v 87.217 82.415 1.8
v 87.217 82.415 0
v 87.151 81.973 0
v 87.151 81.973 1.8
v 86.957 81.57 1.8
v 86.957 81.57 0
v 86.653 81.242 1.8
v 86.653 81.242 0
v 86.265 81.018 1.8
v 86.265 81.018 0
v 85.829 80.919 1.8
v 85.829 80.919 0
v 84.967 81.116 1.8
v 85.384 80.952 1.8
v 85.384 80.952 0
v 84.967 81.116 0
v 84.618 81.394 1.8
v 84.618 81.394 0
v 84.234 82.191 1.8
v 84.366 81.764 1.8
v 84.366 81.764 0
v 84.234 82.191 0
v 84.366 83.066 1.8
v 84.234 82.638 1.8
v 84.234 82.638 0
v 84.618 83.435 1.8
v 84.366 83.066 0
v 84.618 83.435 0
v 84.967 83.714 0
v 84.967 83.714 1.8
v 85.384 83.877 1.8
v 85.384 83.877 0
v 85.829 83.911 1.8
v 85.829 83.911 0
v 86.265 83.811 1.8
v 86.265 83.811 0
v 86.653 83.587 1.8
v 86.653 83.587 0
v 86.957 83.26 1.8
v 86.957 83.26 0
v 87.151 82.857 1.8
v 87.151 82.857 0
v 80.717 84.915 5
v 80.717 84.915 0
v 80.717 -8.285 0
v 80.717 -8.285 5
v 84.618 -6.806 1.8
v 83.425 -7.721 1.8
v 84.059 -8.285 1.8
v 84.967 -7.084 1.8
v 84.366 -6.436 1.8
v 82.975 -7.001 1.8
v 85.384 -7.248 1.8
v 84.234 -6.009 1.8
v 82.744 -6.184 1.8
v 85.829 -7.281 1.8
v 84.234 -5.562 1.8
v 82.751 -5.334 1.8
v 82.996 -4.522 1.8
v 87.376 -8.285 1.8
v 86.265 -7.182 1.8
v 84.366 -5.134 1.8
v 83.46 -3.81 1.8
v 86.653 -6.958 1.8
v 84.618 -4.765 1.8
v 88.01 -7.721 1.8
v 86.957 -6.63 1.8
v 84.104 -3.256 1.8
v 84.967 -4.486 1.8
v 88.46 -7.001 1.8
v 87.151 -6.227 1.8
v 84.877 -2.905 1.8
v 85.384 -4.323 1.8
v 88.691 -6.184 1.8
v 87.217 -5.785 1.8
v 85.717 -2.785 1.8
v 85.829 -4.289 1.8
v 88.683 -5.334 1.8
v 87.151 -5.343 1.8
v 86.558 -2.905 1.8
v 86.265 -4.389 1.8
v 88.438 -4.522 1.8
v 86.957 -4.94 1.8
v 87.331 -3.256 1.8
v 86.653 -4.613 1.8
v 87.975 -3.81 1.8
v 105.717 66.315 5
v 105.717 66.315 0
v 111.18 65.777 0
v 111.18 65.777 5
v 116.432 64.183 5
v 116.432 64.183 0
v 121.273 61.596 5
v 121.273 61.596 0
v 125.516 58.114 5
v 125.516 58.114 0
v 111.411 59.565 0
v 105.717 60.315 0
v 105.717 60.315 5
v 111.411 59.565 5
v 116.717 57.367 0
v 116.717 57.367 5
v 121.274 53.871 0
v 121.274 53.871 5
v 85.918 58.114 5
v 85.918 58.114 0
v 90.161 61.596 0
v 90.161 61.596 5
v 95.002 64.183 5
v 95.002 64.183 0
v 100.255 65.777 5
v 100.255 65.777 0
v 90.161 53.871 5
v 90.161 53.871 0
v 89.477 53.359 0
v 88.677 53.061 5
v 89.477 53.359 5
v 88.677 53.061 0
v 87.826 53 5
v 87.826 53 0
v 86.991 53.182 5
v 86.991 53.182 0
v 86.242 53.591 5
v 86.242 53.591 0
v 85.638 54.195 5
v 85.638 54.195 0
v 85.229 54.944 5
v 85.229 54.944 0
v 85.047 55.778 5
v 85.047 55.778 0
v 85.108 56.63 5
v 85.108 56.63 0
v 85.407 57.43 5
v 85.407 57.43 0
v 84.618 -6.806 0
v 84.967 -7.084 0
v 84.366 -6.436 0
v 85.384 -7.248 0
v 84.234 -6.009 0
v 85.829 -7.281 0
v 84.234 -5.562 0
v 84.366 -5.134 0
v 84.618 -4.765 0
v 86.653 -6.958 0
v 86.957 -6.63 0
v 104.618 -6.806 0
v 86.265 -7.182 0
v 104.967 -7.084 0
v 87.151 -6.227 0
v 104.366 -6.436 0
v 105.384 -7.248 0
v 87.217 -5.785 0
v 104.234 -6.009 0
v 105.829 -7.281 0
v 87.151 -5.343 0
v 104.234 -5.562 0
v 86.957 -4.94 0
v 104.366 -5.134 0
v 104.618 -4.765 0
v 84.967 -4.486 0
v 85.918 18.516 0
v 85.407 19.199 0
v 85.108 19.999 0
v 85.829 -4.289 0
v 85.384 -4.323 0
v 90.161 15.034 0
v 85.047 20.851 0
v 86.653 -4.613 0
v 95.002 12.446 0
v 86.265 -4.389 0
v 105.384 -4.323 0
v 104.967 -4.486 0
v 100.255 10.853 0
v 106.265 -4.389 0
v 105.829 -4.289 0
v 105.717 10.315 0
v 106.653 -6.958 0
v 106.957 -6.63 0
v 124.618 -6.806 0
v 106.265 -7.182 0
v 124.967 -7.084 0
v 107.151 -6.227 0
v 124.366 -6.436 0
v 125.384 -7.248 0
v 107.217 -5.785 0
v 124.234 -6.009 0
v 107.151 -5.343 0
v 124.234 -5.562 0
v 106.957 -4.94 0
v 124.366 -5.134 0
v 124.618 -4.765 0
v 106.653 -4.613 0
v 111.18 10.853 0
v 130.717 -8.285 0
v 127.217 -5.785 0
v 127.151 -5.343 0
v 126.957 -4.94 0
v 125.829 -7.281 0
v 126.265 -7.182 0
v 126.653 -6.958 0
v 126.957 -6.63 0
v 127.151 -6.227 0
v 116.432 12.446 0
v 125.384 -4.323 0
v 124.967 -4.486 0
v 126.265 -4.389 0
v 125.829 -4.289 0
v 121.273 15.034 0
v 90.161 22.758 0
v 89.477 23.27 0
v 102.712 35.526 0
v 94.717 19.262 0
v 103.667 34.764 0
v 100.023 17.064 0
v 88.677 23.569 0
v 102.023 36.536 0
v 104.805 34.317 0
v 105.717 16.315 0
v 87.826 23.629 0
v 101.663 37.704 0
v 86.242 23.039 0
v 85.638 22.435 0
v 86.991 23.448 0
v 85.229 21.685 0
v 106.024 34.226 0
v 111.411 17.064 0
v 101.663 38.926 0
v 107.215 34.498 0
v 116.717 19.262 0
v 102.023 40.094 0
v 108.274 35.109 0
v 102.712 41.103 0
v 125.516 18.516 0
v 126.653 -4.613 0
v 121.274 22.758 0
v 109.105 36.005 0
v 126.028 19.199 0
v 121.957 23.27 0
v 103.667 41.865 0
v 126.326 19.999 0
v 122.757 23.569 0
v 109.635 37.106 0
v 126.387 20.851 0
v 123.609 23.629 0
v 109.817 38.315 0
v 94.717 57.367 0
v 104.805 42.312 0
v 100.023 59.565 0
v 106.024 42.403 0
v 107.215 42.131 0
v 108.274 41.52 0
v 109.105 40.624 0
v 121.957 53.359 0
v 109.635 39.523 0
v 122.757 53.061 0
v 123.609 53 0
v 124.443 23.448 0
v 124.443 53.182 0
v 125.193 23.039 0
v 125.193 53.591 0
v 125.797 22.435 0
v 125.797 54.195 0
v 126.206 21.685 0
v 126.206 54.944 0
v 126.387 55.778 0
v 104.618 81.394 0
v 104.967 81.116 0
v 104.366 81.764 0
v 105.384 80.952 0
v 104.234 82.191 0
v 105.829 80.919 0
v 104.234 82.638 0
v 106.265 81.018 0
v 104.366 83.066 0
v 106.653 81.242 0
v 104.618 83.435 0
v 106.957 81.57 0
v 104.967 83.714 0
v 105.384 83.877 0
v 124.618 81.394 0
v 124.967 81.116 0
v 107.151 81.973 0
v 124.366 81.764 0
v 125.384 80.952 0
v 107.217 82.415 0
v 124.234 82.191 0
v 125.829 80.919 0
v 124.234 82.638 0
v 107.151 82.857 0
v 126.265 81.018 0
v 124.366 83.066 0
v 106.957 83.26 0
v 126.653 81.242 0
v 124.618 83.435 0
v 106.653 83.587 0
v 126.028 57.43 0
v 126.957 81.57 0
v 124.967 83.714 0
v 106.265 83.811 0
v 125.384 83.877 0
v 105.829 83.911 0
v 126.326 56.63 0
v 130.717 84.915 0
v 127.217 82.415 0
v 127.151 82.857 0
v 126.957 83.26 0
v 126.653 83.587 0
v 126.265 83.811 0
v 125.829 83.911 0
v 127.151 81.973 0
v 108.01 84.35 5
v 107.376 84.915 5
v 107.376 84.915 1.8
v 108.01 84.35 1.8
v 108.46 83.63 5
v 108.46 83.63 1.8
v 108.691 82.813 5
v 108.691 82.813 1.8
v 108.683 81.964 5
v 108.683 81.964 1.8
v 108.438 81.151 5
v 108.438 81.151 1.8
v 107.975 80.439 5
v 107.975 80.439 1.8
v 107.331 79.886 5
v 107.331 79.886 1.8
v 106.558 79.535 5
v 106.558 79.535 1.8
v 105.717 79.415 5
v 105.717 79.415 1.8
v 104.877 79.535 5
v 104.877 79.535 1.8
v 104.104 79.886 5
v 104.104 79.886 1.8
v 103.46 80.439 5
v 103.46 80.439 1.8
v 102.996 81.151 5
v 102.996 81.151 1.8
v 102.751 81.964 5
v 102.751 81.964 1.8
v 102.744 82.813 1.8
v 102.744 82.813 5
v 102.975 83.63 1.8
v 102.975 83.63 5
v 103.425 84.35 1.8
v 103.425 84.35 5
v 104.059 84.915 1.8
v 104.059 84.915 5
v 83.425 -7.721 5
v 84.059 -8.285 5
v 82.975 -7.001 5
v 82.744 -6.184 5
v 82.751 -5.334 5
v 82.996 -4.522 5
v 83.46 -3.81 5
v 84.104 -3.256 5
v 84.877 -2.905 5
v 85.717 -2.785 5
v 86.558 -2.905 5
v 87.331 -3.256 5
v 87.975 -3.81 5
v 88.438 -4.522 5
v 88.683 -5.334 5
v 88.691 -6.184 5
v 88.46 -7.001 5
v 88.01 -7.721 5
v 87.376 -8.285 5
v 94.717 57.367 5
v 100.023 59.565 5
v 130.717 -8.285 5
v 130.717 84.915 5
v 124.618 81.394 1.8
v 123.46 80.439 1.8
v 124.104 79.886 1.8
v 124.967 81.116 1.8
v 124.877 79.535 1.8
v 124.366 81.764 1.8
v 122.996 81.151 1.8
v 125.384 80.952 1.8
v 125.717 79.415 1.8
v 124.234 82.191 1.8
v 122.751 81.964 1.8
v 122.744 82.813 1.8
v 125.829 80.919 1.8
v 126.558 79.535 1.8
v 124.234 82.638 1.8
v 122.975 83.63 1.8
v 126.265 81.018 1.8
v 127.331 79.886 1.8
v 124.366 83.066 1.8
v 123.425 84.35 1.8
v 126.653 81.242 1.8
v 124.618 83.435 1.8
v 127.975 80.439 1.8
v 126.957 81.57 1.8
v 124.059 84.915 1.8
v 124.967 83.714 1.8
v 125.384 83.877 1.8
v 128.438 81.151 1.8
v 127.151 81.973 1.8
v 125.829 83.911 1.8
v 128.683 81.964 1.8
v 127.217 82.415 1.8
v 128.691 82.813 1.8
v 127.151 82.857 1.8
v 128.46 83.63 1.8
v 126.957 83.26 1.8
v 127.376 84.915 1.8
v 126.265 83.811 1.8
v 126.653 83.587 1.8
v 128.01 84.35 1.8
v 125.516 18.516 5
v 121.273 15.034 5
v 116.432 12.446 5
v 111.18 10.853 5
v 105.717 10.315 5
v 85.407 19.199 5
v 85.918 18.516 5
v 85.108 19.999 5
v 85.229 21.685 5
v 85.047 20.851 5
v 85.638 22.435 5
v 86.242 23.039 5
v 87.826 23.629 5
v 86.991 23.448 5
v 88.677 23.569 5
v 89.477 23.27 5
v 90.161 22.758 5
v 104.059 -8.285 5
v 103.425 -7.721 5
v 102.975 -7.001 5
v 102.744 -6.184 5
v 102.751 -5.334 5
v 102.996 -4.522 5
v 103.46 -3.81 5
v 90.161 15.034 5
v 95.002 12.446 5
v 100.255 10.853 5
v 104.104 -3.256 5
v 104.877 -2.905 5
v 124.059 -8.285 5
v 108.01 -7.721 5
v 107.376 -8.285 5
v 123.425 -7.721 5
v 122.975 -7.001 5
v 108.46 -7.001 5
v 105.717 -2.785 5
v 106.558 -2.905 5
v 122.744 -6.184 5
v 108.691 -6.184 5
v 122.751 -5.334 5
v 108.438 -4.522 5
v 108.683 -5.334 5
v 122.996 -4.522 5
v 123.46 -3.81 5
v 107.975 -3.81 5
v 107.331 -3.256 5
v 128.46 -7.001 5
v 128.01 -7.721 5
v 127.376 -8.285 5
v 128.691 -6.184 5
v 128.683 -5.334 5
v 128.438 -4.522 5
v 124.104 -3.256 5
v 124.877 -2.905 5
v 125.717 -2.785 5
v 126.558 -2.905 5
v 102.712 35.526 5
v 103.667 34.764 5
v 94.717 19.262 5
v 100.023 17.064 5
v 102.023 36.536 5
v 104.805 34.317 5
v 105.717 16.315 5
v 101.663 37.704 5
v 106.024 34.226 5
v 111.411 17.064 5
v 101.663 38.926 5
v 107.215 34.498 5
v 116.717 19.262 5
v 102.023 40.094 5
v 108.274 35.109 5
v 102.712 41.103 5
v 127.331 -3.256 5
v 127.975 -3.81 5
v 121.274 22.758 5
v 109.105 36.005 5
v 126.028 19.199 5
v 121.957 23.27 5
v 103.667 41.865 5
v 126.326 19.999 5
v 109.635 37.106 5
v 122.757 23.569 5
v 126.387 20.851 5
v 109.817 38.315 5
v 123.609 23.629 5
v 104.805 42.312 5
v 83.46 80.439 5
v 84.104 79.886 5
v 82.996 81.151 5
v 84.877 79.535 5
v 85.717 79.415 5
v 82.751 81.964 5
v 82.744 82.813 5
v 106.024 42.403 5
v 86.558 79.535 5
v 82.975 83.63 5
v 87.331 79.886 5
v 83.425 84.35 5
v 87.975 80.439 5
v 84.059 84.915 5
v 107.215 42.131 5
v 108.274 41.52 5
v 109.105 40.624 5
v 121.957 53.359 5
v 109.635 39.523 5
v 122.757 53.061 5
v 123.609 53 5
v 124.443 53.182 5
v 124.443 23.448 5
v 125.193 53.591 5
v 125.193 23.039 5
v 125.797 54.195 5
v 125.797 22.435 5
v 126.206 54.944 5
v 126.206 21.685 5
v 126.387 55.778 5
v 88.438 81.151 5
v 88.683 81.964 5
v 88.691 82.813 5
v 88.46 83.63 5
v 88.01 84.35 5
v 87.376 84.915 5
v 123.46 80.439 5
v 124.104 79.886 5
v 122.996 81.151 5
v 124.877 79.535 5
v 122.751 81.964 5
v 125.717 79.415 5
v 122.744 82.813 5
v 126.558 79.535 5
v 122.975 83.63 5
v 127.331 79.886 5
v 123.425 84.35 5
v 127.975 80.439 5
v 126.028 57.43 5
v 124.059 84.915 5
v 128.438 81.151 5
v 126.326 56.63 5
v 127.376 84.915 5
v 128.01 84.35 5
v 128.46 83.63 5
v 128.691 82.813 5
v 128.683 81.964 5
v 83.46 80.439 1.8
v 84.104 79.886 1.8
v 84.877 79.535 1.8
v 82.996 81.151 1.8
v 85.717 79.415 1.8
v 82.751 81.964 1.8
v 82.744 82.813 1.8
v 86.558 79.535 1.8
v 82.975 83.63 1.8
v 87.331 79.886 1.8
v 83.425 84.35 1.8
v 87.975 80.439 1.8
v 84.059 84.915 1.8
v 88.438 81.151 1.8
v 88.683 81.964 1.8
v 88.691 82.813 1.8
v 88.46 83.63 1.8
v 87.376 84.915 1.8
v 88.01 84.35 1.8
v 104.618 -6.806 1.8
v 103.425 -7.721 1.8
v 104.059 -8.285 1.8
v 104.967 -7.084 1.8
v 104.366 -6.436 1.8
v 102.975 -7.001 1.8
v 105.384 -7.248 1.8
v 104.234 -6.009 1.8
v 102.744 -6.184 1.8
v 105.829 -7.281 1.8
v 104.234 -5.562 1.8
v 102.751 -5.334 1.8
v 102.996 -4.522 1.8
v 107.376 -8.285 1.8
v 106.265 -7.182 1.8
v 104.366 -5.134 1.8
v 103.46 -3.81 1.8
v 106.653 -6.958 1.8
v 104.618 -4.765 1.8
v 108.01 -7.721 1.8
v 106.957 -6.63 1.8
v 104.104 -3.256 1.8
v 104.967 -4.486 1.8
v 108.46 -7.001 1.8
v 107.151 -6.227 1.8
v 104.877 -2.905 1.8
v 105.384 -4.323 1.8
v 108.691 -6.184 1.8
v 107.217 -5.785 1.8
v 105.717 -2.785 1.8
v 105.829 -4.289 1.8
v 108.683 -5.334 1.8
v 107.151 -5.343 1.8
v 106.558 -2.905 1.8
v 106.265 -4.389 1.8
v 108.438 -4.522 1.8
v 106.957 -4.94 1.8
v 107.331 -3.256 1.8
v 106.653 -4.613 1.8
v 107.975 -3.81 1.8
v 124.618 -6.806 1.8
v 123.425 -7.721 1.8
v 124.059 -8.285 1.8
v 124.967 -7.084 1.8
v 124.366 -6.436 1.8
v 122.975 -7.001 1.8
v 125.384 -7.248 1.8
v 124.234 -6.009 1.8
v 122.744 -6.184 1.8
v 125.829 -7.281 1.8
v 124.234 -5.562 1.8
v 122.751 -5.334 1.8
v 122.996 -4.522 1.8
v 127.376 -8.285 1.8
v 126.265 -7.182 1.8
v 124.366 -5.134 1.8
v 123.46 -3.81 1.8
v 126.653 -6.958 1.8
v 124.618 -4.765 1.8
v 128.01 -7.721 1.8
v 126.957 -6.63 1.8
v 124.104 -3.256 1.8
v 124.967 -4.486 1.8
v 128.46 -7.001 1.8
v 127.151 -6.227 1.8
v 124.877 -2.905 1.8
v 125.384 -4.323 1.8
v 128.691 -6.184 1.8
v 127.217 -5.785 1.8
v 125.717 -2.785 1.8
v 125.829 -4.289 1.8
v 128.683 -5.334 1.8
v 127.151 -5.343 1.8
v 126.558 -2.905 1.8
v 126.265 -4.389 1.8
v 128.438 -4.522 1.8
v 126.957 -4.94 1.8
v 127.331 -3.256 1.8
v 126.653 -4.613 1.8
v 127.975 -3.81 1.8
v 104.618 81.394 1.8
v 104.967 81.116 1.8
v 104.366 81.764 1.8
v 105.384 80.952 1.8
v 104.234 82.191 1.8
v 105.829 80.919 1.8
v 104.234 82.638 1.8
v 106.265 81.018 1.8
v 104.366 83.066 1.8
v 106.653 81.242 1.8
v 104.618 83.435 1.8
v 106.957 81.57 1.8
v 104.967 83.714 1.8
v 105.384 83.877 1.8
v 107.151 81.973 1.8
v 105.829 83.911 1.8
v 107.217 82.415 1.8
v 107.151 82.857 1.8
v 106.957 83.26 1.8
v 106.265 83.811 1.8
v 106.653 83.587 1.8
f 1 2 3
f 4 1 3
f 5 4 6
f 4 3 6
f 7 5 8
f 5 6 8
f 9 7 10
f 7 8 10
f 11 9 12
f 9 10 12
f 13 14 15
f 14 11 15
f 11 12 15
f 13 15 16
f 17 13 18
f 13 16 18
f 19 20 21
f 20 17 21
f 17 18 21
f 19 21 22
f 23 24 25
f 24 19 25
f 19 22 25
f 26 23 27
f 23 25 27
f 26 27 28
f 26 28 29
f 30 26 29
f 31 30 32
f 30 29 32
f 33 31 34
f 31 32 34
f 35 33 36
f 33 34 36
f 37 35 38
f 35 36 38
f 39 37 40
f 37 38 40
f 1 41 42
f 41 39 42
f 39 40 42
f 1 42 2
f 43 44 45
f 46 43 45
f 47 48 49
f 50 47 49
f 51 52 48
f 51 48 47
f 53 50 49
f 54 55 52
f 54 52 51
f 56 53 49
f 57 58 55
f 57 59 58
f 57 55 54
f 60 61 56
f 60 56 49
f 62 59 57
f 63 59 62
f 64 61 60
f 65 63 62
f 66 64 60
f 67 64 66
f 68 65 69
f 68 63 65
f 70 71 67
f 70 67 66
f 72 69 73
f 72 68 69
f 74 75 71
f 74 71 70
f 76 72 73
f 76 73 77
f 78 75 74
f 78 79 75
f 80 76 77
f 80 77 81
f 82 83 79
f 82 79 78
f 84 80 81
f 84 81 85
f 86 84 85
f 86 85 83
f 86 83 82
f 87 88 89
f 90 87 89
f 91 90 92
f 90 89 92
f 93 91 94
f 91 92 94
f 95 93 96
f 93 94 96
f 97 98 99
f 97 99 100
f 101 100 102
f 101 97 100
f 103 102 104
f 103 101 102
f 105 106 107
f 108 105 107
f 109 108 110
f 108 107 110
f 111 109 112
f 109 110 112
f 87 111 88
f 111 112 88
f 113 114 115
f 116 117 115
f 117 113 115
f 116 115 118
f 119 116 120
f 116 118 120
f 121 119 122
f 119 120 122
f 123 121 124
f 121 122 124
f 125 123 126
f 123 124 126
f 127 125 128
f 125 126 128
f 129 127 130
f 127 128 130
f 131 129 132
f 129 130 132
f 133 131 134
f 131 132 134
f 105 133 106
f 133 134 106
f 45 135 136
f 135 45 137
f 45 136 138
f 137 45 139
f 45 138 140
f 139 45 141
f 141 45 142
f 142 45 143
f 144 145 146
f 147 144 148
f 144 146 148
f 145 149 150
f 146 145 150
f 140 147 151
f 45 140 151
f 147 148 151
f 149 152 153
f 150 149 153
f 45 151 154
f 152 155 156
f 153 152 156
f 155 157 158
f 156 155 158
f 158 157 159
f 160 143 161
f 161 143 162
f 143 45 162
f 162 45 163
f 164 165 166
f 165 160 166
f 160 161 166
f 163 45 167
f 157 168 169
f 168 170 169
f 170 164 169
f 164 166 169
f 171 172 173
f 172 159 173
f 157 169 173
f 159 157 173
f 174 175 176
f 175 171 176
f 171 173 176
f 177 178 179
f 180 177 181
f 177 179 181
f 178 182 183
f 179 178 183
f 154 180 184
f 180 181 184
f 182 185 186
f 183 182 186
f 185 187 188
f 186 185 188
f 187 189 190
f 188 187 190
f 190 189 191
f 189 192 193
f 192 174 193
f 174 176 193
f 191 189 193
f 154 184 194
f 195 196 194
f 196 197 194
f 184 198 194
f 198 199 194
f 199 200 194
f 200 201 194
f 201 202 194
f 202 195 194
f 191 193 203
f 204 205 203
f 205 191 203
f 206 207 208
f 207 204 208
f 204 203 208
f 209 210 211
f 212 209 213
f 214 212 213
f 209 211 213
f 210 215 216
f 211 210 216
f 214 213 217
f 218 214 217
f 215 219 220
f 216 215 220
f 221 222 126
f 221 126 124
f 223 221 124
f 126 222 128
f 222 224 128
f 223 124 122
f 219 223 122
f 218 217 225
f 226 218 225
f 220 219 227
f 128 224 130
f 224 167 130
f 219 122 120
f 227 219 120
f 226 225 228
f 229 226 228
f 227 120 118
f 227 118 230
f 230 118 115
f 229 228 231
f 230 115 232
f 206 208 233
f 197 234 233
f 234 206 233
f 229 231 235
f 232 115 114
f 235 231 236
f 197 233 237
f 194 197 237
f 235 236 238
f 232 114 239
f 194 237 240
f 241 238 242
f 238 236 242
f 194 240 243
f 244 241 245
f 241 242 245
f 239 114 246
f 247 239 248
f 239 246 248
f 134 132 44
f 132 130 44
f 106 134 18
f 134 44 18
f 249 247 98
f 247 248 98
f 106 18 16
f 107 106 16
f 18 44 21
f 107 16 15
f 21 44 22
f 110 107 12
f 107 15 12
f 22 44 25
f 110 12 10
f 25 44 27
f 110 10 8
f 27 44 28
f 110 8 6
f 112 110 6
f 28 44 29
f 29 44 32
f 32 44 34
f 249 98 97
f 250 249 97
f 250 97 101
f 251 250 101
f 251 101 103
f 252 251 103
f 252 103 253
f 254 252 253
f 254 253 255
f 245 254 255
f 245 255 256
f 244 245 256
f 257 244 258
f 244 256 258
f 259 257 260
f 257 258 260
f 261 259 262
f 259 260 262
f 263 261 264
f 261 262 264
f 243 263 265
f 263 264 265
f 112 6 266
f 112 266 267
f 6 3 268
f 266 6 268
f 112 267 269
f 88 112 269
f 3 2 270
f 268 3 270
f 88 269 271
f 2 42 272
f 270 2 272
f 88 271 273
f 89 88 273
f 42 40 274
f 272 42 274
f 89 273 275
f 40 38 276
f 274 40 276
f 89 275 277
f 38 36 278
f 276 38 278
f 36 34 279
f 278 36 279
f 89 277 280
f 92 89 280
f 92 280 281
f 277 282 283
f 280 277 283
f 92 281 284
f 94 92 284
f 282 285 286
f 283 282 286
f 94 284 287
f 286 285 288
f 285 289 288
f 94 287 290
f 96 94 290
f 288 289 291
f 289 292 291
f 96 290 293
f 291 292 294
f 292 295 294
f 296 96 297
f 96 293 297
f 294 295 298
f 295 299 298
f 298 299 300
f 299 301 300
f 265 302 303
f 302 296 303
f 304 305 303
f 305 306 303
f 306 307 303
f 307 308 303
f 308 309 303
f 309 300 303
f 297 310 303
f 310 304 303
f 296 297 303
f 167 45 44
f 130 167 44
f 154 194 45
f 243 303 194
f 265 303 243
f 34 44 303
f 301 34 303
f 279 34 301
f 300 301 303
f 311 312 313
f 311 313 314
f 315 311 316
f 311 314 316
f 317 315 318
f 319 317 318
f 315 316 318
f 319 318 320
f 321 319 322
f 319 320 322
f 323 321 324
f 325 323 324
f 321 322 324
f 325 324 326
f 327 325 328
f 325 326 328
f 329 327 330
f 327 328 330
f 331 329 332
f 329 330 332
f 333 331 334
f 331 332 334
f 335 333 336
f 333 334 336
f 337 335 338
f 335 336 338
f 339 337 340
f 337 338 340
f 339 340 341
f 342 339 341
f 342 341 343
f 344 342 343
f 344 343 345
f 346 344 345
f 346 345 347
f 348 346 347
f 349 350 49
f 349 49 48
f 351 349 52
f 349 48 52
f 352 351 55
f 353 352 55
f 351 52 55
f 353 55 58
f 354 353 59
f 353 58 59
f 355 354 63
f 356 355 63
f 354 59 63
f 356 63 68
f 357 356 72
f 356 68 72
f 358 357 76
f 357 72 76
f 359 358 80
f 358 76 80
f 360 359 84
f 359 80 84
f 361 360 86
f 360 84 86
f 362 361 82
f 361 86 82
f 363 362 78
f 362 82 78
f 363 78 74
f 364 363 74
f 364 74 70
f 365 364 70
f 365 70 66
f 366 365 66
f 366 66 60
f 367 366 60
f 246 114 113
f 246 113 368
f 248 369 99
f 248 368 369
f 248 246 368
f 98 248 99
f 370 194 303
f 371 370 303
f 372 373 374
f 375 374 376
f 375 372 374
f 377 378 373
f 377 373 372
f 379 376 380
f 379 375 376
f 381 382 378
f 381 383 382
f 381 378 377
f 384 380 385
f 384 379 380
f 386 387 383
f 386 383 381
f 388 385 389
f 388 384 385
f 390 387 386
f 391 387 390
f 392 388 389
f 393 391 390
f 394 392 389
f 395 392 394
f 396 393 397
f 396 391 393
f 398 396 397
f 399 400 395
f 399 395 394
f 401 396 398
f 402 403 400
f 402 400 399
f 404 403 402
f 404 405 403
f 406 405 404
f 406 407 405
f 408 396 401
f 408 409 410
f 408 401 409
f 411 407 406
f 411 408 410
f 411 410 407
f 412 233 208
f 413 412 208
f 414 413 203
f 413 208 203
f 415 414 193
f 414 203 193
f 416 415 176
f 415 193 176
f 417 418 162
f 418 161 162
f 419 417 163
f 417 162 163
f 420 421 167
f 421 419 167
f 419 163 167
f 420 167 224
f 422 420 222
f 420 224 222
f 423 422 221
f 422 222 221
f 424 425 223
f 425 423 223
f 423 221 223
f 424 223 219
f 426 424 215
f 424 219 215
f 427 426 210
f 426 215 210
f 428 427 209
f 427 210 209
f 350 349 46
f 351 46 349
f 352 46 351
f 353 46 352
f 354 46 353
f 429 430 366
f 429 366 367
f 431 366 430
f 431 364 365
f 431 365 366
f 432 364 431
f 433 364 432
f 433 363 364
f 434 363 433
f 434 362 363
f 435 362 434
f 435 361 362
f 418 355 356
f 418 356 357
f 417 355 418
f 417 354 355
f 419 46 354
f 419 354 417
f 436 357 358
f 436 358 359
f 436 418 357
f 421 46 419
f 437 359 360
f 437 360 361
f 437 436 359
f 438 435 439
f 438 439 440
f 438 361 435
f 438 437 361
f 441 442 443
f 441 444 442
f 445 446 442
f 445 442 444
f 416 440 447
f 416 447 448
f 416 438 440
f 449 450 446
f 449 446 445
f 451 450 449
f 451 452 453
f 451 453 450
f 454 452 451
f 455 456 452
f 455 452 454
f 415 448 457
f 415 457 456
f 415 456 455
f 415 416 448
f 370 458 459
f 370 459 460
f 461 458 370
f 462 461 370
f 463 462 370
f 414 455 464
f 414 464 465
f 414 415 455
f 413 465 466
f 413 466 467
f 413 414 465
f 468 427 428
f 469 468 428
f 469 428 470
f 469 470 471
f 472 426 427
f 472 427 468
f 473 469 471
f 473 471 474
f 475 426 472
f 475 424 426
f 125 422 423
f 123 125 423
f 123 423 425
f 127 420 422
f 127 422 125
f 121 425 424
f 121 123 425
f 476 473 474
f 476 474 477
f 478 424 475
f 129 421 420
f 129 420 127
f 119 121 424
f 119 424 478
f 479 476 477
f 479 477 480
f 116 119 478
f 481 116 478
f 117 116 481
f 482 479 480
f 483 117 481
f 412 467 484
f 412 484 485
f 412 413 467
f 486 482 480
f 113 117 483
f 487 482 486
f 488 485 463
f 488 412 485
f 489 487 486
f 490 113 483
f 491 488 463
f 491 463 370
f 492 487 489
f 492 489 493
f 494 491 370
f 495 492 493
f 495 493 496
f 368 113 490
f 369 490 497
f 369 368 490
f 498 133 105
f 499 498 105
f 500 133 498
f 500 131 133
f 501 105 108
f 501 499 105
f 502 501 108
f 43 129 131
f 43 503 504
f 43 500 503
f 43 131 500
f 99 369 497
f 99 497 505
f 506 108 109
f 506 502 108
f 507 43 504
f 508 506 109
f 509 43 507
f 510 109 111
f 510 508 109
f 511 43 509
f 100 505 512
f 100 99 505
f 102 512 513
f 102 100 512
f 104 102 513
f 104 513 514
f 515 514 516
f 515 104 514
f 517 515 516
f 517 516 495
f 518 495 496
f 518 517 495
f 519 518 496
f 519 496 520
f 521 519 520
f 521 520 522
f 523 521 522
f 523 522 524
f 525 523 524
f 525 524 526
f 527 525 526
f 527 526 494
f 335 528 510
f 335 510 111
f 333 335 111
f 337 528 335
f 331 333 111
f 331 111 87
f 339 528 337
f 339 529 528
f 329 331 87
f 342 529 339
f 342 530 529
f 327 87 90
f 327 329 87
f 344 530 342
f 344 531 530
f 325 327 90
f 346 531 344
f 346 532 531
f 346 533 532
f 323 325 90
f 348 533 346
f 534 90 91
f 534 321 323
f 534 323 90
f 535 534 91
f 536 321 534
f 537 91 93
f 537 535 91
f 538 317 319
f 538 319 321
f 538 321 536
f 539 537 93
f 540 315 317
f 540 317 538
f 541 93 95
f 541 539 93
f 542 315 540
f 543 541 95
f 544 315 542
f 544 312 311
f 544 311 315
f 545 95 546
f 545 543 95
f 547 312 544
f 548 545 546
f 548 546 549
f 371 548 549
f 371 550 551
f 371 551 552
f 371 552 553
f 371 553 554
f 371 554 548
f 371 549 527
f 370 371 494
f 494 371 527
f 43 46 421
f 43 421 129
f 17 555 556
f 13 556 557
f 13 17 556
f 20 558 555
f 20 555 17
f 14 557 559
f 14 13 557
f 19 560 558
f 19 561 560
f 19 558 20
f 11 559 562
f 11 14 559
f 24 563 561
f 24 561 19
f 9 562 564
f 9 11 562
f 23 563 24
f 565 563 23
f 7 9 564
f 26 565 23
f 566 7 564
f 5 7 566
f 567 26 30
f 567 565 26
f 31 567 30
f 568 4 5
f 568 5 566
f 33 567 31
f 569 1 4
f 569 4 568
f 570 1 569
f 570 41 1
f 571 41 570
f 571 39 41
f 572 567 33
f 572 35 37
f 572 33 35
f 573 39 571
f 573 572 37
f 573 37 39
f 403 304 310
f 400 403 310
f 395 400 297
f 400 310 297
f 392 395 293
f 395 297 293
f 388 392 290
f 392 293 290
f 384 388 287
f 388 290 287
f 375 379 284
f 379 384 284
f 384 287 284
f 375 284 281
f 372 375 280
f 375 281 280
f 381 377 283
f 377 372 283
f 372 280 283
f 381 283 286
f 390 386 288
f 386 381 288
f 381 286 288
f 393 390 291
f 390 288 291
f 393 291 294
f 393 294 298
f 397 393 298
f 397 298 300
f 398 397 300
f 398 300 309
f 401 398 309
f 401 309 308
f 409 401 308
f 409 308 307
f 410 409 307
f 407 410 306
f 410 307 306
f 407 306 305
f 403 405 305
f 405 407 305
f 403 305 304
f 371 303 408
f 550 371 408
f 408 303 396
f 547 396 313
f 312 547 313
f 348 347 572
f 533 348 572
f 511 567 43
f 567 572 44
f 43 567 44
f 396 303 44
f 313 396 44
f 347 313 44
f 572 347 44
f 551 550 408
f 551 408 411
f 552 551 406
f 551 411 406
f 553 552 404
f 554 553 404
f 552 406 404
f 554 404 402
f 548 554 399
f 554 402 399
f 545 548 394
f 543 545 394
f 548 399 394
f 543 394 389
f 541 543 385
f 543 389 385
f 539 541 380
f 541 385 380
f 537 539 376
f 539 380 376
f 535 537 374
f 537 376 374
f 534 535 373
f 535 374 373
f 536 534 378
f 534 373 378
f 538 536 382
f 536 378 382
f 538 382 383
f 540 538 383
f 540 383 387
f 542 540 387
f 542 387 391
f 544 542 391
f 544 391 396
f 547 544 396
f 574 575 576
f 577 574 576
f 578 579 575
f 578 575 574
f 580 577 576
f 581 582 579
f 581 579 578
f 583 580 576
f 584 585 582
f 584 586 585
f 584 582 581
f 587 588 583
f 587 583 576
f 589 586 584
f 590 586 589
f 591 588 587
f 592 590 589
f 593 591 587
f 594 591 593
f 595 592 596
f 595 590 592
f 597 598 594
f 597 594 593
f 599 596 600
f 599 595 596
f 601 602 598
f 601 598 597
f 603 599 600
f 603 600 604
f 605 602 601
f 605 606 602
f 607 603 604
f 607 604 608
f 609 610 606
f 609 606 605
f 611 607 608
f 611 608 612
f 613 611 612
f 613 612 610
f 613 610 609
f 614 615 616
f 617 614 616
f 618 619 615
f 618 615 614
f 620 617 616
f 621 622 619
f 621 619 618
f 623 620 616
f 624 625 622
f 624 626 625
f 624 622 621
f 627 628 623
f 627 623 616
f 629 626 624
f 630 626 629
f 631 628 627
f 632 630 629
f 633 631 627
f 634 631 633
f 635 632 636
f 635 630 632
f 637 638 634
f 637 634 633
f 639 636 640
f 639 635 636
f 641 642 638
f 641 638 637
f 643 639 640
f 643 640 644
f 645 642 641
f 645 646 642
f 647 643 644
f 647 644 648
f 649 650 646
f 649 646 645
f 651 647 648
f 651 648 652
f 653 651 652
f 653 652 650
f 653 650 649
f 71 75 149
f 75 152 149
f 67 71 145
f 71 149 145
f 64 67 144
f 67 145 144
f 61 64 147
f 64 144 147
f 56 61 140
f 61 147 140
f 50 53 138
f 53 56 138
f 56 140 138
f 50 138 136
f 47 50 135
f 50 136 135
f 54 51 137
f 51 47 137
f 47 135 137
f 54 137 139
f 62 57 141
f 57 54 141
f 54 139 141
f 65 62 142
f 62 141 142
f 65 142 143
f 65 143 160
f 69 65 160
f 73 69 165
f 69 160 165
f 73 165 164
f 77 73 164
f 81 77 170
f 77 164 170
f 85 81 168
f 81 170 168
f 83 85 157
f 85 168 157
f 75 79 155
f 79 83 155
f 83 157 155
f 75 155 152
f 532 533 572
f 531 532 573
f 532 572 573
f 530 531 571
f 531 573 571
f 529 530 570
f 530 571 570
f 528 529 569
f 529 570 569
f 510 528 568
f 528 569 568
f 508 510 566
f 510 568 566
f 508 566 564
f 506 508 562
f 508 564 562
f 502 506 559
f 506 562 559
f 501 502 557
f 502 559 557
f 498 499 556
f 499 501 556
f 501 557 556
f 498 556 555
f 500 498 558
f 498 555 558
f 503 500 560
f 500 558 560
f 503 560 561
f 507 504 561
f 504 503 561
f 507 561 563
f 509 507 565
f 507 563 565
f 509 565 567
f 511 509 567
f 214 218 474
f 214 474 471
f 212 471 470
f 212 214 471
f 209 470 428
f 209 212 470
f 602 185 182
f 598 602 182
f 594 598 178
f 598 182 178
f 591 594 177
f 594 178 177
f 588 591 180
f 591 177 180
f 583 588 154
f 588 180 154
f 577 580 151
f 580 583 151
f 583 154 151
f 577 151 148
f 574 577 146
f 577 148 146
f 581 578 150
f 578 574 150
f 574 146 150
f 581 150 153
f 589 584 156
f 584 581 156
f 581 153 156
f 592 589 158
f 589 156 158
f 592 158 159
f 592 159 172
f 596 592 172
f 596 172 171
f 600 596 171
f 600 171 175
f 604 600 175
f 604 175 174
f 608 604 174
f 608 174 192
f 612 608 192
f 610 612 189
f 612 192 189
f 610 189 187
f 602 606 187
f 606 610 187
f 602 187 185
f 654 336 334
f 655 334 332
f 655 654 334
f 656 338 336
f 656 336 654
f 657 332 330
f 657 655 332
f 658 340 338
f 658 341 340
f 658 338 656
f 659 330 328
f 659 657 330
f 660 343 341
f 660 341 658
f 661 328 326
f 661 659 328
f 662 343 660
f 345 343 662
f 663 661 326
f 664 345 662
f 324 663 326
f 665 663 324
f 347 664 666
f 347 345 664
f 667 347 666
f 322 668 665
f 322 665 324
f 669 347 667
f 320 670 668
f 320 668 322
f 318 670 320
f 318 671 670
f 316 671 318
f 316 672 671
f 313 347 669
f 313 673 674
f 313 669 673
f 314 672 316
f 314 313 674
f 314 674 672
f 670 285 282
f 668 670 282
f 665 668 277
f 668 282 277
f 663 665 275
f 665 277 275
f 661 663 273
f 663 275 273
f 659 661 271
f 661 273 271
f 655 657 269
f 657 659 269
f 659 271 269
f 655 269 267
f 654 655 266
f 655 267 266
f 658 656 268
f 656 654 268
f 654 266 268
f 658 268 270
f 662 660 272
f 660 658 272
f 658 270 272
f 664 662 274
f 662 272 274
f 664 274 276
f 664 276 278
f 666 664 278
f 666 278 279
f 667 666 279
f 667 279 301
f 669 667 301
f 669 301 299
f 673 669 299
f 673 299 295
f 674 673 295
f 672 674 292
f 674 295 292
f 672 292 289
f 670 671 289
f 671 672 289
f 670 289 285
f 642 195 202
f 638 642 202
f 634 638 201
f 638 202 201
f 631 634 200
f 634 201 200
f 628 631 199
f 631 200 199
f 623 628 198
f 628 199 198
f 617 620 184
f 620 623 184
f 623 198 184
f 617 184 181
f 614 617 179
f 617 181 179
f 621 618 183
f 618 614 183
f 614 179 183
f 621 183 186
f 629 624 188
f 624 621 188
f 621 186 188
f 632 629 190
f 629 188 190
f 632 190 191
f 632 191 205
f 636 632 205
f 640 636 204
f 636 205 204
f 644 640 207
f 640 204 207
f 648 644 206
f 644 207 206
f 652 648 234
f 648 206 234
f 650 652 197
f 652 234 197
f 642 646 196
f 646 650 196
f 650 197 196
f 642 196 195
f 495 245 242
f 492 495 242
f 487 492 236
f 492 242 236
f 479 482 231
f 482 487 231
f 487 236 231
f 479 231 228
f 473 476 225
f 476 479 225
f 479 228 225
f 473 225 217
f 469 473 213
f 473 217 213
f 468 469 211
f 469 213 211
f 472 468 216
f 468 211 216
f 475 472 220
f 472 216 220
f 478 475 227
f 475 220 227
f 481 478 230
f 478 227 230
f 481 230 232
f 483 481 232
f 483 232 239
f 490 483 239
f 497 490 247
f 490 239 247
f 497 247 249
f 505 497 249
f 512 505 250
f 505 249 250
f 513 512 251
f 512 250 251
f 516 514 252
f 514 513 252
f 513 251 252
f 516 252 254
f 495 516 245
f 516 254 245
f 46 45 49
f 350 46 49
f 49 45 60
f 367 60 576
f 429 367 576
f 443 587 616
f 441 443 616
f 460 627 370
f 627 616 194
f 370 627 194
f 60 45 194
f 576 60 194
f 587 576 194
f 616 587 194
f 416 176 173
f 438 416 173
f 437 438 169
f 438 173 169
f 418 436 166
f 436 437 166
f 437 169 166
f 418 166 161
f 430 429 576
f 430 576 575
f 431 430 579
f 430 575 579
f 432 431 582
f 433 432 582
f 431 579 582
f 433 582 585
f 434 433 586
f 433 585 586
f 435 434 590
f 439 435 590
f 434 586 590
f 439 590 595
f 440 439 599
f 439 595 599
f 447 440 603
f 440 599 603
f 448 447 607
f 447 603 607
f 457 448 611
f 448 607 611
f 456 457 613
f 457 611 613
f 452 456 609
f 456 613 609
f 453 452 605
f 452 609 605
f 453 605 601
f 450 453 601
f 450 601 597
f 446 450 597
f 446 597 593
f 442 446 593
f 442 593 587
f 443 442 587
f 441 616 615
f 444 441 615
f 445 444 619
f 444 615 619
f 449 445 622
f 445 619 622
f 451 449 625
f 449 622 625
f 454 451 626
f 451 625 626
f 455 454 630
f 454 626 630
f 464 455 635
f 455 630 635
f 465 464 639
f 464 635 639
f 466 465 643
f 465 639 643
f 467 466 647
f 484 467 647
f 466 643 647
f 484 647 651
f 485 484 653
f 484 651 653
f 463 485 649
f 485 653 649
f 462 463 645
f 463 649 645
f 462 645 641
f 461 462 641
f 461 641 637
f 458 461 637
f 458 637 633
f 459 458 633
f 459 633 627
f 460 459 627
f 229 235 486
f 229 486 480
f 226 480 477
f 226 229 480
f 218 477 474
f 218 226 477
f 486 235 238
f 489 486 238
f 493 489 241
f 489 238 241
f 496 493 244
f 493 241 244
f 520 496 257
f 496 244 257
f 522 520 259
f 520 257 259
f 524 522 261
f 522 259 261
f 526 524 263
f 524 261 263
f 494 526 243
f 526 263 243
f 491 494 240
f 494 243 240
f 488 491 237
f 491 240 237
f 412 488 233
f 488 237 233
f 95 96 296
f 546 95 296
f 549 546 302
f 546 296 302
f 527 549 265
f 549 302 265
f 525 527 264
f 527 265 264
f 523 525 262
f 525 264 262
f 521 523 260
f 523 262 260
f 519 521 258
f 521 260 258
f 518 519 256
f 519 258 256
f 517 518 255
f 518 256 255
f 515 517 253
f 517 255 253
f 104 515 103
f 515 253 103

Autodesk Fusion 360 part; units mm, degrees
sketch "Schizzo5" plane through (0, 0, 0) normal (0, 0, 1) x (1, 0, 0)
  line L0 (80.7173, 84.9147) -> (80.7173, -8.2853)
  circle A0 centre (85.7173, -5.7853) radius 1.5
  circle A1 centre (105.7173, 38.3147) radius 25 construction
  arc A2 (125.5163, 58.1137) -> (105.7173, 66.3147) centre (105.7173, 38.3147) ccw
  circle A3 centre (123.395, 55.9924) radius 3
  circle A4 centre (88.0397, 55.9924) radius 3
  arc A5 (105.7173, 66.3147) -> (85.9183, 58.1137) centre (105.7173, 38.3147) ccw
  circle A6 centre (125.7173, 82.4147) radius 3
  arc A7 (105.7173, 10.3147) -> (125.5163, 18.5157) centre (105.7173, 38.3147) ccw
  line L1 (80.7173, 38.3147) -> (130.7173, 38.3147) construction
  circle A8 centre (105.7173, 82.4147) radius 1.5
  circle A9 centre (85.7173, 82.4147) radius 3
  line L2 (105.7173, 38.3147) -> (123.395, 20.6371) construction
  arc A10 (105.7173, 66.3147) -> (85.9183, 58.1137) centre (105.7173, 38.3147) ccw
  circle A11 centre (85.7173, 82.4147) radius 1.5
  line L3 (130.7173, 84.9147) -> (80.7173, 84.9147)
  arc A12 (125.5163, 58.1137) -> (105.7173, 66.3147) centre (105.7173, 38.3147) ccw
  circle A13 centre (125.7173, 82.4147) radius 1.5
  line L4 (105.7173, 38.3147) -> (89.6274, 54.4047) construction
  circle A14 centre (105.7173, 82.4147) radius 3
  arc A15 (105.7173, 10.3147) -> (125.5163, 18.5157) centre (105.7173, 38.3147) ccw
  line L5 (105.7173, 38.3147) -> (105.7173, 13.3147) construction
  circle A16 centre (105.7173, 38.3147) radius 4.1
  circle A17 centre (105.7173, -5.7853) radius 1.5
  circle A18 centre (88.0397, 20.6371) radius 3
  line L6 (130.7173, -8.2853) -> (130.7173, 84.9147)
  arc A19 (85.9183, 18.5157) -> (105.7173, 10.3147) centre (105.7173, 38.3147) ccw
  line L7 (85.7173, 84.9147) -> (85.7173, -8.2853) construction
  arc A20 (105.7173, 13.3147) -> (123.395, 20.6371) centre (105.7173, 38.3147) ccw
  circle A21 centre (123.395, 20.6371) radius 3
  circle A22 centre (85.7173, -5.7853) radius 3
  circle A23 centre (105.7173, -5.7853) radius 3
  circle A24 centre (125.7173, -5.7853) radius 1.5
  line L8 (105.7173, 38.3147) -> (123.668, 56.2654) construction
  line L9 (80.7173, -8.2853) -> (130.7173, -8.2853)
  circle A25 centre (125.7173, -5.7853) radius 3
  line L10 (80.7173, -5.7853) -> (130.7173, -5.7853) construction
  line L11 (105.7173, 38.3147) -> (88.0397, 20.6371) construction
  arc A26 (85.9183, 18.5157) -> (105.7173, 10.3147) centre (105.7173, 38.3147) ccw
  line L12 (105.7173, 84.9147) -> (105.7173, -8.2853) construction
  arc A27 (88.0397, 20.6371) -> (105.7173, 13.3147) centre (105.7173, 38.3147) ccw
  line L13 (105.7173, 38.3147) -> (105.7173, 63.3147) construction
  line L14 (105.7173, 38.3147) -> (105.7173, 63.3147) construction
  line L15 (105.7173, 38.3147) -> (105.7173, 13.3147) construction
  arc A28 (105.7173, 16.3147) -> (121.2737, 22.7584) centre (105.7173, 38.3147) ccw
  arc A29 (90.161, 22.7584) -> (105.7173, 16.3147) centre (105.7173, 38.3147) ccw
  arc A30 (105.7173, 60.3147) -> (90.161, 53.8711) centre (105.7173, 38.3147) ccw
  arc A31 (121.2737, 53.8711) -> (105.7173, 60.3147) centre (105.7173, 38.3147) ccw
  dimension "d219" = 3
  dimension "d220" = 3
  dimension "d221" = 50
  dimension "d222" = 93.2
  dimension "d223" = 2.5
  dimension "d224" = 20
  dimension "d225" = 3
  dimension "d226" = 6
  dimension "d227" = 3
  dimension "d228" = 6
  dimension "d229" = 8.2
  dimension "d230" = 45
  dimension "d231" = 6
  dimension "d232" = 45
  dimension "d233" = 6
  dimension "d246" = -3
  dimension "d247" = -3
extrude "Estrusione24" add sketch "Schizzo5" along normal blind 5 contours L0 A6 A9 L3 A14 L6 A22 A23 L9 A25
extrude "Estrusione25" add sketch "Schizzo5" along normal blind 1.8 contours A9 L3 | A22 L9 | L3 A14 | A23 L9 | A6 L3 | L9 A25 picked at (85.7547, 84.58) picked at (85.7547, -7.9505) picked at (105.7547, 84.58) picked at (105.7547, -7.9505) picked at (125.7547, 84.58) picked at (125.7547, -7.9505)
equation "d225 = d227"
equation "d226 = d228"
